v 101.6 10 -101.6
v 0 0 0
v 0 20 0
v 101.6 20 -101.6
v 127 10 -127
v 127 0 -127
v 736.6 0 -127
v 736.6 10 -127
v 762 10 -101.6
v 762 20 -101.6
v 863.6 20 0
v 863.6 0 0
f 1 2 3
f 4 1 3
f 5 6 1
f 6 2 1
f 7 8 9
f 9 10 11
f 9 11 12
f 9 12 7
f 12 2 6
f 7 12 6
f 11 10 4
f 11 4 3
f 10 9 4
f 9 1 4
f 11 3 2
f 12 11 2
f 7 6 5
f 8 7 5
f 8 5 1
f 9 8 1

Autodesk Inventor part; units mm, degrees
ref_plane "YZ Plane" through (0, 0, 0) normal (1, 0, 0) x (0, 1, 0)
ref_plane "XZ Plane" through (0, 0, 0) normal (0, 1, 0) x (-1, 0, 0)
ref_plane "XY Plane" through (0, 0, 0) normal (0, 0, 1) x (1, 0, 0)
sketch "Sketch1" plane through (0, 0, 0) normal (1, 0, 0) x (0, 1, 0)
  line L0 (0, 0) -> (0, -127)
  line L1 (0, -127) -> (10, -127)
  line L2 (10, -127) -> (10, -101.6)
  line L3 (10, -101.6) -> (20, -101.6)
  line L4 (20, -101.6) -> (20, 0)
  line L5 (20, 0) -> (0, 0)
  dimension "d0" = 127
  dimension "d1" = 10
  dimension "d2" = 25.4
  dimension "d3" = 10
extrude "Extrusion1" add sketch "Sketch1" along normal blind 863.6
chamfer "Chamfer1" distance 127 angle 45 1 edges at (863.6, 5, -127)
chamfer "Chamfer2" distance 127 angle 45 1 edges at (0, 5, -127)
properties part number "SkirtWidth" material "Wood (Birch)"
